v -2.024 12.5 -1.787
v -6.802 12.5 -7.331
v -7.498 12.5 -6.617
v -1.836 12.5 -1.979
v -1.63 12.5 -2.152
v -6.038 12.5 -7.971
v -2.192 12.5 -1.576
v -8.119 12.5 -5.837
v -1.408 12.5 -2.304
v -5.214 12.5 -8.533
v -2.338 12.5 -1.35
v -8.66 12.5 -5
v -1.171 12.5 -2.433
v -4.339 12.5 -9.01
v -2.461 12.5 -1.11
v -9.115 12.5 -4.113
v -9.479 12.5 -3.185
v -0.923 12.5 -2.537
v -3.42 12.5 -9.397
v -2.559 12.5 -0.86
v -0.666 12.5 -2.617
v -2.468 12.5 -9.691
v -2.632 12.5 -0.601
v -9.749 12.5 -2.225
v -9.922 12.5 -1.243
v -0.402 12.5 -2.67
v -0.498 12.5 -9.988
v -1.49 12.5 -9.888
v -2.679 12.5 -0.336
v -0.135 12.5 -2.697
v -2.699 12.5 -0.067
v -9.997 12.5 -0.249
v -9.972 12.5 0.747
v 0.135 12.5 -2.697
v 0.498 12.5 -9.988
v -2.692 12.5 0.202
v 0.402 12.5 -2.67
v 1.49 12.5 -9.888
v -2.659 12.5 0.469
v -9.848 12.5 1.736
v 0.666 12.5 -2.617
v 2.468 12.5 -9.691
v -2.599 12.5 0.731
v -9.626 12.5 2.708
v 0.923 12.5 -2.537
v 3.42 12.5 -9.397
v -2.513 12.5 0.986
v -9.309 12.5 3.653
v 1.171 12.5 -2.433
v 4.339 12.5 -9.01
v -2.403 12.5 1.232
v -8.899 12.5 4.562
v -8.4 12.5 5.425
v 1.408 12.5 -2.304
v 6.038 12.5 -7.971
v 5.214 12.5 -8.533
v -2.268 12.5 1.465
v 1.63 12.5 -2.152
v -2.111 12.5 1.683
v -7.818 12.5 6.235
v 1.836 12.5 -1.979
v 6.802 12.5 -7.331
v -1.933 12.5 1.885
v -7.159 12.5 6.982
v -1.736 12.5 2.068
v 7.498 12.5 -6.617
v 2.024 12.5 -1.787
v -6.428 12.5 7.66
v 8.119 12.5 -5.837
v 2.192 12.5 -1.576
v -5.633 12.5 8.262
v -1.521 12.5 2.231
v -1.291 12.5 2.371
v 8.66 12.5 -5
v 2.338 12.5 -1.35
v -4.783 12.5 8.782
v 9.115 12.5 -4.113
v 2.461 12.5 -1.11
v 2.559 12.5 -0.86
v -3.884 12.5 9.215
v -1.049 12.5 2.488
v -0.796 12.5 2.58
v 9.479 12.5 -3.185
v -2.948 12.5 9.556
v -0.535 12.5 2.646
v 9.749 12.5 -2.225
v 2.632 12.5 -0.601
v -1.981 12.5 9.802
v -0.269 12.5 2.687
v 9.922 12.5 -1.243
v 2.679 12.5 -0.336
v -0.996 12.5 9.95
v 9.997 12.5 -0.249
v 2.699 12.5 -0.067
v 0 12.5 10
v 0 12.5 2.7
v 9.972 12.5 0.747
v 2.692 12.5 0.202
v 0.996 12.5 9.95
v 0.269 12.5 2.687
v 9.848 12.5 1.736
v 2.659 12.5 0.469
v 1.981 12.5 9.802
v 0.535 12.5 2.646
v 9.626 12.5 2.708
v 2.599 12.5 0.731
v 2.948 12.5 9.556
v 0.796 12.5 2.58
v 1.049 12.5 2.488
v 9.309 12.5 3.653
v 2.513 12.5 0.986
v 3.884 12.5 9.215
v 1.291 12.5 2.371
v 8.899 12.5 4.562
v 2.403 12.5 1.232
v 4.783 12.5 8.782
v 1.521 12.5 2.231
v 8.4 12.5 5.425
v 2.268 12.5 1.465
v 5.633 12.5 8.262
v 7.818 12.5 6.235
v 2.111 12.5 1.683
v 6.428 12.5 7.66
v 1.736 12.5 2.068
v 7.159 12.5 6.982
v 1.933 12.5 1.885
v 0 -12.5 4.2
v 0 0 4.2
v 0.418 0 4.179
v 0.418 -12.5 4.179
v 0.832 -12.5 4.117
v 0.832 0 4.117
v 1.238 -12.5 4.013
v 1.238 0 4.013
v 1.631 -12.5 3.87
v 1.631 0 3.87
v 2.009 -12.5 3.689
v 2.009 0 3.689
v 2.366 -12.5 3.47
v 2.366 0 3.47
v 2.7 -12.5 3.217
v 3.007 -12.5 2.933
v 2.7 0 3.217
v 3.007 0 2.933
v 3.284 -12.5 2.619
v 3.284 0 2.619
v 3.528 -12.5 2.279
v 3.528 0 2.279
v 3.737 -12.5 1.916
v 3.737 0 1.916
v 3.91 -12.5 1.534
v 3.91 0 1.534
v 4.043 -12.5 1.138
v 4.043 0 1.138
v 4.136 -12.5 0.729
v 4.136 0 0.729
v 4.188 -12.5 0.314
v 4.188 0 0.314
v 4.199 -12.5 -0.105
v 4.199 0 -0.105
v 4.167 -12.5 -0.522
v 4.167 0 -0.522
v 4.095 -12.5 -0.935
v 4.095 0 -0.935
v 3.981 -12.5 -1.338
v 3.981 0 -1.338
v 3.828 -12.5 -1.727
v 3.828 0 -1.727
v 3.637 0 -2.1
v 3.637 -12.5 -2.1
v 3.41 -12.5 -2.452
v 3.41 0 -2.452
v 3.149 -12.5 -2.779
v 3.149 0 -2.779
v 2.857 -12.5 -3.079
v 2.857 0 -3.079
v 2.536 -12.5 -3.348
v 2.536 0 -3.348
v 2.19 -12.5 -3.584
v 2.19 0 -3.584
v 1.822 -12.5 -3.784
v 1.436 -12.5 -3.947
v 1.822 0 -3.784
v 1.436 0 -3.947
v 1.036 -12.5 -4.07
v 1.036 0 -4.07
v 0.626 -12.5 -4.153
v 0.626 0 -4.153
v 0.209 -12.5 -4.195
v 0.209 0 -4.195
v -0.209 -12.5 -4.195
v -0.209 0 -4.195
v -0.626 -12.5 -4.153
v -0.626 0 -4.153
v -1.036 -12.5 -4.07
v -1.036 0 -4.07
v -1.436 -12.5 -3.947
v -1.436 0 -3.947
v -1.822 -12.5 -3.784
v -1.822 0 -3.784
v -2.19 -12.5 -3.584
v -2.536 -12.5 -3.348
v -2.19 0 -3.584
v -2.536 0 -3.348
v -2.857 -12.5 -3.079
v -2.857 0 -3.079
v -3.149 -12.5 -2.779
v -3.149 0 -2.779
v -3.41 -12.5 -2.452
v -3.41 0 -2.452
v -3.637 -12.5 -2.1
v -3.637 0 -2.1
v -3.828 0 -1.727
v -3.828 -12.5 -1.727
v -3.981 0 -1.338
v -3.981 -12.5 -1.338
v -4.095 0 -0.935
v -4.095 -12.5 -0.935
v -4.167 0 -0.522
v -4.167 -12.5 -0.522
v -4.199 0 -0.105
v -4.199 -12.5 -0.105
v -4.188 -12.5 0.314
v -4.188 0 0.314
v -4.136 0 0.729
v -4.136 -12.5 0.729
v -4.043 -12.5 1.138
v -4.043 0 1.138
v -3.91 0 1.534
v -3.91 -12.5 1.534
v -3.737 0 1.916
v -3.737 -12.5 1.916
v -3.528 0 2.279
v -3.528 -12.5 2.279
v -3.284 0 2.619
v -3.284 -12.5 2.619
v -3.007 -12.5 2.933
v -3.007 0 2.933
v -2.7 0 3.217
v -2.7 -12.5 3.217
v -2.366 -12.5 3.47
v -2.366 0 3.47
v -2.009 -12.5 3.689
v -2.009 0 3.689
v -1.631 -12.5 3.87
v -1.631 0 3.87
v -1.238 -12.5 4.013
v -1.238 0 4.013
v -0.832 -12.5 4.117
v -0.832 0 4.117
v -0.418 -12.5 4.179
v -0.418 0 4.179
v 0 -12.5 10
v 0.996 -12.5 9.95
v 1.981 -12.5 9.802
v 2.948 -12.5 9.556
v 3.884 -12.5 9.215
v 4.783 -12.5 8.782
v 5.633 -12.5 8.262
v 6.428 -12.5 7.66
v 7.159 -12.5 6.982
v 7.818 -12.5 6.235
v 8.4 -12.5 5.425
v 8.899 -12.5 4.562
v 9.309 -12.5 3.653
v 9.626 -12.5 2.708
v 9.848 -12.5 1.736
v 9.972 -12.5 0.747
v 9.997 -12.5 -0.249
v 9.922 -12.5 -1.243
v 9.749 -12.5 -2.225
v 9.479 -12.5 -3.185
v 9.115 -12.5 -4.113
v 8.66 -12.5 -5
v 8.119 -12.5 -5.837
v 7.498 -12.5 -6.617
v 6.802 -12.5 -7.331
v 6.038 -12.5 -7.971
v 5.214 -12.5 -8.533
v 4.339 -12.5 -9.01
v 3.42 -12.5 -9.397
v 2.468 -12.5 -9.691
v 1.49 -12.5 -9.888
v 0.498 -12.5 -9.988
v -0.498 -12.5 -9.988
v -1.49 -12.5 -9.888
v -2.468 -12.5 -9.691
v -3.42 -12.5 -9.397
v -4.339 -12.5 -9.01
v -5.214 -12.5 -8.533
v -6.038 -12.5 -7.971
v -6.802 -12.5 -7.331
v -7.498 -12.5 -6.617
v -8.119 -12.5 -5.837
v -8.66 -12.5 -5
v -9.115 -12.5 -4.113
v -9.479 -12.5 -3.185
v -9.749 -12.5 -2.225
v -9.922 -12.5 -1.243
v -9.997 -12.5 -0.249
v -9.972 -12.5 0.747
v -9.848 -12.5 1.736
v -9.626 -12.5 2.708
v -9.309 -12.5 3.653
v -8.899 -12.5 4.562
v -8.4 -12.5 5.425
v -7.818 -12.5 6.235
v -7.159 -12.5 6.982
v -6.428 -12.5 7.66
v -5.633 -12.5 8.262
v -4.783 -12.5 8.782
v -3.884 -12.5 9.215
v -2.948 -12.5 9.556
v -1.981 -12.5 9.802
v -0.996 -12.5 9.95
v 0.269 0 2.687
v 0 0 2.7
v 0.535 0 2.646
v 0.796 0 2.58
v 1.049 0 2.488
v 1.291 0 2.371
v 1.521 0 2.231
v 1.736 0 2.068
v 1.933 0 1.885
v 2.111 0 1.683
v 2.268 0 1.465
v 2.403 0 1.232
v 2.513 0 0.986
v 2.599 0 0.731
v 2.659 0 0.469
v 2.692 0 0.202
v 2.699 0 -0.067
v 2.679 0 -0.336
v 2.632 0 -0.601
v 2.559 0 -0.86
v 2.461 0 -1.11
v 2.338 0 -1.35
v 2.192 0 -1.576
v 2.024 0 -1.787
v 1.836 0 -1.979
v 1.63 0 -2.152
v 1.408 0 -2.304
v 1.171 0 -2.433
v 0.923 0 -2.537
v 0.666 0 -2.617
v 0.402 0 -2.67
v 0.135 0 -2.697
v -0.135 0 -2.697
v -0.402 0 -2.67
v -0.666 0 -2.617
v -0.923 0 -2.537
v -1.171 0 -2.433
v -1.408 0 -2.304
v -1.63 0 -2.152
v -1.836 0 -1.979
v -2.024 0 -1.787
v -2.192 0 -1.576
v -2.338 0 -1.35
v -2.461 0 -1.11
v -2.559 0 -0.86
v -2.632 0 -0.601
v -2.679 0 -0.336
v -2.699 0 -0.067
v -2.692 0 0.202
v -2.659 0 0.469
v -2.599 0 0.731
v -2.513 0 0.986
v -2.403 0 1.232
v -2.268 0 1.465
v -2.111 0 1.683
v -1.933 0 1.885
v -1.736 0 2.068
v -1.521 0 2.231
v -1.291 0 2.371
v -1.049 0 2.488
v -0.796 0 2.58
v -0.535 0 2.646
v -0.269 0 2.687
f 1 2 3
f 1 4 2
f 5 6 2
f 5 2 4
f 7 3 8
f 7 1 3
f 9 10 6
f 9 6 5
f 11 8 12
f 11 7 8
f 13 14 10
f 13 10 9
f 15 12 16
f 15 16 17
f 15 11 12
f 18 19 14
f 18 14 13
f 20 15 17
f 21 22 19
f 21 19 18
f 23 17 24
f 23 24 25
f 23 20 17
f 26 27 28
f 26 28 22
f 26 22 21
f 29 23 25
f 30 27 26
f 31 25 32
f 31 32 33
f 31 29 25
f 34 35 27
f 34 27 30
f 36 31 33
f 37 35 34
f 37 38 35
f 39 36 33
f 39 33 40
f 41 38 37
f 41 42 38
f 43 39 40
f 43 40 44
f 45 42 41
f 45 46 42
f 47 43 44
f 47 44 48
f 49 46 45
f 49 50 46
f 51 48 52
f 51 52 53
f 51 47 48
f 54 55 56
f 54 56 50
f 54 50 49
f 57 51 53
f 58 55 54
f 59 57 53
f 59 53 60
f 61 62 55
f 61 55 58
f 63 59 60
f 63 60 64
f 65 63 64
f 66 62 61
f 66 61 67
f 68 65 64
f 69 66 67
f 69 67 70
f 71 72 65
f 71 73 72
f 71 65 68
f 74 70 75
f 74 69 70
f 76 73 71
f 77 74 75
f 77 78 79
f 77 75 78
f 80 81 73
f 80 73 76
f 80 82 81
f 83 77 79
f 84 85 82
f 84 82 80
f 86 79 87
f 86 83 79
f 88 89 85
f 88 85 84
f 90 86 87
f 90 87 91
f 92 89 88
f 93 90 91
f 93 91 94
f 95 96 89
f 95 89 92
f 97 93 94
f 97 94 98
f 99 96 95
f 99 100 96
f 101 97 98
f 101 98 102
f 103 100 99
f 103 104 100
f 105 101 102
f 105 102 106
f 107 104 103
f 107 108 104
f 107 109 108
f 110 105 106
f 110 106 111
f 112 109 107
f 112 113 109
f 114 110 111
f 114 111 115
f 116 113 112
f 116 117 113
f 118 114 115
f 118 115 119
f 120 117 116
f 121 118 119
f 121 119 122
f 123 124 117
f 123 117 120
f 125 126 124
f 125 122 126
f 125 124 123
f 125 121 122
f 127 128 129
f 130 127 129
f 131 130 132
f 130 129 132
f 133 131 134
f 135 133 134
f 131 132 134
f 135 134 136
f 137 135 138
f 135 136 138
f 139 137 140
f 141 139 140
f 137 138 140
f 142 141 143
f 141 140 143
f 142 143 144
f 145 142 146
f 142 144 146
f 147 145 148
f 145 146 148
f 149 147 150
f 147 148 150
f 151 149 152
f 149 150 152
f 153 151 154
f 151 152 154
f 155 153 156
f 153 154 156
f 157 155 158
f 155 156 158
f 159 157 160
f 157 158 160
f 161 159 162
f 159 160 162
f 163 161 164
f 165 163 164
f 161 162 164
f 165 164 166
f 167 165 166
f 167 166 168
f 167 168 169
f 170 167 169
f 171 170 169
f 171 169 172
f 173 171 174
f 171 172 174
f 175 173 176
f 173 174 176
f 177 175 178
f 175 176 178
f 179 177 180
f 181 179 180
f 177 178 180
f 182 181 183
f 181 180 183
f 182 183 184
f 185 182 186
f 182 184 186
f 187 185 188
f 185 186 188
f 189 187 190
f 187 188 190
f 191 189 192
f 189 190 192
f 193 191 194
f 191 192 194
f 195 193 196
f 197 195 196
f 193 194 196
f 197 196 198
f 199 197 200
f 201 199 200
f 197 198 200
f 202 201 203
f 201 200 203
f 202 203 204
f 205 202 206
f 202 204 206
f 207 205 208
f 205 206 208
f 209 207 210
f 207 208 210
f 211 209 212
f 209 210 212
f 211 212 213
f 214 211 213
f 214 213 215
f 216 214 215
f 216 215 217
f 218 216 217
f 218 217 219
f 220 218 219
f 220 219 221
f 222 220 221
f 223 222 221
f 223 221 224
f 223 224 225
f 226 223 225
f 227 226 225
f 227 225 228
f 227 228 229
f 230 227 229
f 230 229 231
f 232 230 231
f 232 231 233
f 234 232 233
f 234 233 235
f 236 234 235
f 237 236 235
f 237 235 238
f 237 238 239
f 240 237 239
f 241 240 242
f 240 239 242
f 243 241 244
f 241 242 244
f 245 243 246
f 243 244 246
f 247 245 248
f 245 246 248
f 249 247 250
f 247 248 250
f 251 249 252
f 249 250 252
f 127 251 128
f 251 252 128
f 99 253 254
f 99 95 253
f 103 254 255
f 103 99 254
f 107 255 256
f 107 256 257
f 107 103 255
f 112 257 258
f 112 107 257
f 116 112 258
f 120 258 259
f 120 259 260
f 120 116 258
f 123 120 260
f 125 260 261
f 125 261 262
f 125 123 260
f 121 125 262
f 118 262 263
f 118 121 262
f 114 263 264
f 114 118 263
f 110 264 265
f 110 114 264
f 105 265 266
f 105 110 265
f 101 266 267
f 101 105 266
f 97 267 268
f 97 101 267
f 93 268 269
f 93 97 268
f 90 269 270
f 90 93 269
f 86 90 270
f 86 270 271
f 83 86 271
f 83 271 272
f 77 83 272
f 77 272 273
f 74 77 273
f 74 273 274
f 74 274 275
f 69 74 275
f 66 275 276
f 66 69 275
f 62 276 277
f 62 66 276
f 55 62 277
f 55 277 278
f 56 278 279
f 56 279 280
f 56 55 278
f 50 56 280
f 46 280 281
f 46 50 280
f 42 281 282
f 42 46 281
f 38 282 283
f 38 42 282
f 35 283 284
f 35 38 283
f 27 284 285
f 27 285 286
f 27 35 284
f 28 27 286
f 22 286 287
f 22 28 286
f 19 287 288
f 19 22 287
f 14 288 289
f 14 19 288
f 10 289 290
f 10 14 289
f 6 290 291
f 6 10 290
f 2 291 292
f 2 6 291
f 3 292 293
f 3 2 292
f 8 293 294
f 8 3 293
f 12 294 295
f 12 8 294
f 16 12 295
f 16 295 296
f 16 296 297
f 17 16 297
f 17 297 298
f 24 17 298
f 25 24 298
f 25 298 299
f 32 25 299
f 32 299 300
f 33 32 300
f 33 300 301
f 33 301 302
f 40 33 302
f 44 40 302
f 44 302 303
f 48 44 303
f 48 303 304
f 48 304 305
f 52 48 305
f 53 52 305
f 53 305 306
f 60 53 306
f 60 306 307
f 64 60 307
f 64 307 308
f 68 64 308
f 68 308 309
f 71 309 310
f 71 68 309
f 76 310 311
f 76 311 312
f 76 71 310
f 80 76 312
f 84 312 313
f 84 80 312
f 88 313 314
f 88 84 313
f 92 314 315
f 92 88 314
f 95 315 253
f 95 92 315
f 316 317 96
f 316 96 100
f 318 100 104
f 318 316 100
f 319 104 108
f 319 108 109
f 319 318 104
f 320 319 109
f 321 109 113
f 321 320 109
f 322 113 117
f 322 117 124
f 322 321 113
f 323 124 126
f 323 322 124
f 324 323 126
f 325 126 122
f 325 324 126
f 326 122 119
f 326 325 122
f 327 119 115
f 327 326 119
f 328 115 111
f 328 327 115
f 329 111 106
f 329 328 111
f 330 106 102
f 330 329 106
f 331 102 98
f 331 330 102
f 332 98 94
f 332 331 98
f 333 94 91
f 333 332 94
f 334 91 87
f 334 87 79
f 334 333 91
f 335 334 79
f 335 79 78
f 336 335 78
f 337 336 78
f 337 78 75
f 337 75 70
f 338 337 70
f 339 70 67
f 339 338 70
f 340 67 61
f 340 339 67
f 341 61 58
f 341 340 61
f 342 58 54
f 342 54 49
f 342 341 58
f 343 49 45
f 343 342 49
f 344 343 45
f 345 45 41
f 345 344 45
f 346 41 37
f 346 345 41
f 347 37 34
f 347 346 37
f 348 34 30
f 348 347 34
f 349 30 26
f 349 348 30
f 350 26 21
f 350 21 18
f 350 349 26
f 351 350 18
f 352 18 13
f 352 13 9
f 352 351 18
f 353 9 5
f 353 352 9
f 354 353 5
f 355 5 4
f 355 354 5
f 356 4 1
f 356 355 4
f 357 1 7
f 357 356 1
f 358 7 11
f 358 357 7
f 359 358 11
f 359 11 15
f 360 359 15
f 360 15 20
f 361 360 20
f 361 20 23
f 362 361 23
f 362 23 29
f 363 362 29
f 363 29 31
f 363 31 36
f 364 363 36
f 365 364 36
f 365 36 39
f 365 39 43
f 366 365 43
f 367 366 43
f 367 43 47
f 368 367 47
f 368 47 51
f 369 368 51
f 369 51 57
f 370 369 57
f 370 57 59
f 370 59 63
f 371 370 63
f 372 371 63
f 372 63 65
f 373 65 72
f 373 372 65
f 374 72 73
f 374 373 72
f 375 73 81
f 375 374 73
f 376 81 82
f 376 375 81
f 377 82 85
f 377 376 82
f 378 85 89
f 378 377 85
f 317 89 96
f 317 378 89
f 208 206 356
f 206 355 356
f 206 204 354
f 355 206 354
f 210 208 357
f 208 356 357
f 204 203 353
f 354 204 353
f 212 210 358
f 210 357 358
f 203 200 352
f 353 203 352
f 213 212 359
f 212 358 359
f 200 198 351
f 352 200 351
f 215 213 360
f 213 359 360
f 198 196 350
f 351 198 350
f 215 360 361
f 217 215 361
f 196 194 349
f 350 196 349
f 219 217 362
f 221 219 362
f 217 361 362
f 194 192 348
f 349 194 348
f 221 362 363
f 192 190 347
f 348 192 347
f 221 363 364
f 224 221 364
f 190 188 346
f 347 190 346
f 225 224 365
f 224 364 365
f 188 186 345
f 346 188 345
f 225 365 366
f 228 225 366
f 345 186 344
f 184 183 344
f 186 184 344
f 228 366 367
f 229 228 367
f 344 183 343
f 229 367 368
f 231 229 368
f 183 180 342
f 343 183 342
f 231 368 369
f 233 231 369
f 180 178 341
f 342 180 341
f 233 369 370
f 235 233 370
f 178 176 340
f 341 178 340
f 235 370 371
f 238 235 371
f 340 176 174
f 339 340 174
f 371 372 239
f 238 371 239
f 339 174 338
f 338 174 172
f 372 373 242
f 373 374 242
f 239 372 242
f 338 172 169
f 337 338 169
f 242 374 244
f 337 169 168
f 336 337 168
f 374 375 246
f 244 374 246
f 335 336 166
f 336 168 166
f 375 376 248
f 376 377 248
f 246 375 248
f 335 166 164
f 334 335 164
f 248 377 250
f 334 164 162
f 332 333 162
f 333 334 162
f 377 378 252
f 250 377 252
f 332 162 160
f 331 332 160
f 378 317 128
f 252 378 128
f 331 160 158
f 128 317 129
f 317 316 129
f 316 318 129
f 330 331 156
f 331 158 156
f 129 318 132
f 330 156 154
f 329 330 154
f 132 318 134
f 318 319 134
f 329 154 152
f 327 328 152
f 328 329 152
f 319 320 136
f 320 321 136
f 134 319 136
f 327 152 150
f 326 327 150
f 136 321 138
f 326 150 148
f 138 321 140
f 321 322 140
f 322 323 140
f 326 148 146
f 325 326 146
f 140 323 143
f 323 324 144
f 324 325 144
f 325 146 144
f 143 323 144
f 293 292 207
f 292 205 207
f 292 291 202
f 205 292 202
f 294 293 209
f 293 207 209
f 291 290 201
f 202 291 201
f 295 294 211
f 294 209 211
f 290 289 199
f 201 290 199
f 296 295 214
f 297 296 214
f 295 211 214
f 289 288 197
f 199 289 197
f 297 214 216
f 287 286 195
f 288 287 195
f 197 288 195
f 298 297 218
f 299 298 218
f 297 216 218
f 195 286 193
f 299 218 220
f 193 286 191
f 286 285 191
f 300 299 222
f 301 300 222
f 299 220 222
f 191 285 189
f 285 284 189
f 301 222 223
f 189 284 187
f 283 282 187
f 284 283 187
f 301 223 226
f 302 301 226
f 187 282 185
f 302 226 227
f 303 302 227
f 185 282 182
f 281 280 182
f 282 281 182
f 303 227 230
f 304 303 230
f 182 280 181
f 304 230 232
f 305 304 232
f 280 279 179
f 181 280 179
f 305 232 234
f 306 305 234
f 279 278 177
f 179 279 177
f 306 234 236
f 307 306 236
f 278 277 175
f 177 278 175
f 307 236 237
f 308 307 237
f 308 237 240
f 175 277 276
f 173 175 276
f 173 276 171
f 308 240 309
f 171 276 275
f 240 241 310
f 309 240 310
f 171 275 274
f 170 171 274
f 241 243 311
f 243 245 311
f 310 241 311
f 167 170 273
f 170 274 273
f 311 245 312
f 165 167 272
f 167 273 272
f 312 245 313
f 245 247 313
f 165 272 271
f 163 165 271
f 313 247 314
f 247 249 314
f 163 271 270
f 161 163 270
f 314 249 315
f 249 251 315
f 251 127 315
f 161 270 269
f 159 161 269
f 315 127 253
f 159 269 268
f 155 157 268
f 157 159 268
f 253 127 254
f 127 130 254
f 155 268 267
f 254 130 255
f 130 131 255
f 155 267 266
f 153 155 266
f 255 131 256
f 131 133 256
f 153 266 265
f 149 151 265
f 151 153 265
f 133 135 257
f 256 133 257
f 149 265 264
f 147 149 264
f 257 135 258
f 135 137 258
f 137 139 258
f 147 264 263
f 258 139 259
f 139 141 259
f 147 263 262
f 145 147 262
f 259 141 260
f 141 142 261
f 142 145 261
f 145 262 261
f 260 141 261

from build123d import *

# Parameters (mm, degrees)
SKETCH1_R           = 10
BOSS_EXTRUDE1_DEPTH = 12.5
SKETCH2_R           = 2.7
CUT_EXTRUDE1_DEPTH  = 12.5
SKETCH3_R           = 4.2
CUT_EXTRUDE2_DEPTH  = 12.5


with BuildPart() as part:
    # Sketch1 → Boss-Extrude1 (new, symmetric)
    with BuildSketch(Plane(origin=(0, 0, 0), x_dir=(1, 0, 0), z_dir=(0, 1, 0))):
        with Locations(Location((0, 0, 0), (0, 0, 270))):
            Circle(SKETCH1_R)
    extrude(amount=BOSS_EXTRUDE1_DEPTH, both=True)

    # Sketch2 → Cut-Extrude1 (cut)
    with BuildSketch(Plane(origin=(0, 0, 0), x_dir=(1, 0, 0), z_dir=(0, 1, 0))):
        with Locations(Location((0, 0, 0), (0, 0, 270))):
            Circle(SKETCH2_R)
    extrude(amount=CUT_EXTRUDE1_DEPTH, mode=Mode.SUBTRACT)

    # Sketch3 → Cut-Extrude2 (cut)
    with BuildSketch(Plane(origin=(0, 0, 0), x_dir=(1, 0, 0), z_dir=(0, 1, 0))):
        with Locations(Location((0, 0, 0), (0, 0, 270))):
            Circle(SKETCH3_R)
    extrude(amount=-CUT_EXTRUDE2_DEPTH, mode=Mode.SUBTRACT)


solid = part.part
